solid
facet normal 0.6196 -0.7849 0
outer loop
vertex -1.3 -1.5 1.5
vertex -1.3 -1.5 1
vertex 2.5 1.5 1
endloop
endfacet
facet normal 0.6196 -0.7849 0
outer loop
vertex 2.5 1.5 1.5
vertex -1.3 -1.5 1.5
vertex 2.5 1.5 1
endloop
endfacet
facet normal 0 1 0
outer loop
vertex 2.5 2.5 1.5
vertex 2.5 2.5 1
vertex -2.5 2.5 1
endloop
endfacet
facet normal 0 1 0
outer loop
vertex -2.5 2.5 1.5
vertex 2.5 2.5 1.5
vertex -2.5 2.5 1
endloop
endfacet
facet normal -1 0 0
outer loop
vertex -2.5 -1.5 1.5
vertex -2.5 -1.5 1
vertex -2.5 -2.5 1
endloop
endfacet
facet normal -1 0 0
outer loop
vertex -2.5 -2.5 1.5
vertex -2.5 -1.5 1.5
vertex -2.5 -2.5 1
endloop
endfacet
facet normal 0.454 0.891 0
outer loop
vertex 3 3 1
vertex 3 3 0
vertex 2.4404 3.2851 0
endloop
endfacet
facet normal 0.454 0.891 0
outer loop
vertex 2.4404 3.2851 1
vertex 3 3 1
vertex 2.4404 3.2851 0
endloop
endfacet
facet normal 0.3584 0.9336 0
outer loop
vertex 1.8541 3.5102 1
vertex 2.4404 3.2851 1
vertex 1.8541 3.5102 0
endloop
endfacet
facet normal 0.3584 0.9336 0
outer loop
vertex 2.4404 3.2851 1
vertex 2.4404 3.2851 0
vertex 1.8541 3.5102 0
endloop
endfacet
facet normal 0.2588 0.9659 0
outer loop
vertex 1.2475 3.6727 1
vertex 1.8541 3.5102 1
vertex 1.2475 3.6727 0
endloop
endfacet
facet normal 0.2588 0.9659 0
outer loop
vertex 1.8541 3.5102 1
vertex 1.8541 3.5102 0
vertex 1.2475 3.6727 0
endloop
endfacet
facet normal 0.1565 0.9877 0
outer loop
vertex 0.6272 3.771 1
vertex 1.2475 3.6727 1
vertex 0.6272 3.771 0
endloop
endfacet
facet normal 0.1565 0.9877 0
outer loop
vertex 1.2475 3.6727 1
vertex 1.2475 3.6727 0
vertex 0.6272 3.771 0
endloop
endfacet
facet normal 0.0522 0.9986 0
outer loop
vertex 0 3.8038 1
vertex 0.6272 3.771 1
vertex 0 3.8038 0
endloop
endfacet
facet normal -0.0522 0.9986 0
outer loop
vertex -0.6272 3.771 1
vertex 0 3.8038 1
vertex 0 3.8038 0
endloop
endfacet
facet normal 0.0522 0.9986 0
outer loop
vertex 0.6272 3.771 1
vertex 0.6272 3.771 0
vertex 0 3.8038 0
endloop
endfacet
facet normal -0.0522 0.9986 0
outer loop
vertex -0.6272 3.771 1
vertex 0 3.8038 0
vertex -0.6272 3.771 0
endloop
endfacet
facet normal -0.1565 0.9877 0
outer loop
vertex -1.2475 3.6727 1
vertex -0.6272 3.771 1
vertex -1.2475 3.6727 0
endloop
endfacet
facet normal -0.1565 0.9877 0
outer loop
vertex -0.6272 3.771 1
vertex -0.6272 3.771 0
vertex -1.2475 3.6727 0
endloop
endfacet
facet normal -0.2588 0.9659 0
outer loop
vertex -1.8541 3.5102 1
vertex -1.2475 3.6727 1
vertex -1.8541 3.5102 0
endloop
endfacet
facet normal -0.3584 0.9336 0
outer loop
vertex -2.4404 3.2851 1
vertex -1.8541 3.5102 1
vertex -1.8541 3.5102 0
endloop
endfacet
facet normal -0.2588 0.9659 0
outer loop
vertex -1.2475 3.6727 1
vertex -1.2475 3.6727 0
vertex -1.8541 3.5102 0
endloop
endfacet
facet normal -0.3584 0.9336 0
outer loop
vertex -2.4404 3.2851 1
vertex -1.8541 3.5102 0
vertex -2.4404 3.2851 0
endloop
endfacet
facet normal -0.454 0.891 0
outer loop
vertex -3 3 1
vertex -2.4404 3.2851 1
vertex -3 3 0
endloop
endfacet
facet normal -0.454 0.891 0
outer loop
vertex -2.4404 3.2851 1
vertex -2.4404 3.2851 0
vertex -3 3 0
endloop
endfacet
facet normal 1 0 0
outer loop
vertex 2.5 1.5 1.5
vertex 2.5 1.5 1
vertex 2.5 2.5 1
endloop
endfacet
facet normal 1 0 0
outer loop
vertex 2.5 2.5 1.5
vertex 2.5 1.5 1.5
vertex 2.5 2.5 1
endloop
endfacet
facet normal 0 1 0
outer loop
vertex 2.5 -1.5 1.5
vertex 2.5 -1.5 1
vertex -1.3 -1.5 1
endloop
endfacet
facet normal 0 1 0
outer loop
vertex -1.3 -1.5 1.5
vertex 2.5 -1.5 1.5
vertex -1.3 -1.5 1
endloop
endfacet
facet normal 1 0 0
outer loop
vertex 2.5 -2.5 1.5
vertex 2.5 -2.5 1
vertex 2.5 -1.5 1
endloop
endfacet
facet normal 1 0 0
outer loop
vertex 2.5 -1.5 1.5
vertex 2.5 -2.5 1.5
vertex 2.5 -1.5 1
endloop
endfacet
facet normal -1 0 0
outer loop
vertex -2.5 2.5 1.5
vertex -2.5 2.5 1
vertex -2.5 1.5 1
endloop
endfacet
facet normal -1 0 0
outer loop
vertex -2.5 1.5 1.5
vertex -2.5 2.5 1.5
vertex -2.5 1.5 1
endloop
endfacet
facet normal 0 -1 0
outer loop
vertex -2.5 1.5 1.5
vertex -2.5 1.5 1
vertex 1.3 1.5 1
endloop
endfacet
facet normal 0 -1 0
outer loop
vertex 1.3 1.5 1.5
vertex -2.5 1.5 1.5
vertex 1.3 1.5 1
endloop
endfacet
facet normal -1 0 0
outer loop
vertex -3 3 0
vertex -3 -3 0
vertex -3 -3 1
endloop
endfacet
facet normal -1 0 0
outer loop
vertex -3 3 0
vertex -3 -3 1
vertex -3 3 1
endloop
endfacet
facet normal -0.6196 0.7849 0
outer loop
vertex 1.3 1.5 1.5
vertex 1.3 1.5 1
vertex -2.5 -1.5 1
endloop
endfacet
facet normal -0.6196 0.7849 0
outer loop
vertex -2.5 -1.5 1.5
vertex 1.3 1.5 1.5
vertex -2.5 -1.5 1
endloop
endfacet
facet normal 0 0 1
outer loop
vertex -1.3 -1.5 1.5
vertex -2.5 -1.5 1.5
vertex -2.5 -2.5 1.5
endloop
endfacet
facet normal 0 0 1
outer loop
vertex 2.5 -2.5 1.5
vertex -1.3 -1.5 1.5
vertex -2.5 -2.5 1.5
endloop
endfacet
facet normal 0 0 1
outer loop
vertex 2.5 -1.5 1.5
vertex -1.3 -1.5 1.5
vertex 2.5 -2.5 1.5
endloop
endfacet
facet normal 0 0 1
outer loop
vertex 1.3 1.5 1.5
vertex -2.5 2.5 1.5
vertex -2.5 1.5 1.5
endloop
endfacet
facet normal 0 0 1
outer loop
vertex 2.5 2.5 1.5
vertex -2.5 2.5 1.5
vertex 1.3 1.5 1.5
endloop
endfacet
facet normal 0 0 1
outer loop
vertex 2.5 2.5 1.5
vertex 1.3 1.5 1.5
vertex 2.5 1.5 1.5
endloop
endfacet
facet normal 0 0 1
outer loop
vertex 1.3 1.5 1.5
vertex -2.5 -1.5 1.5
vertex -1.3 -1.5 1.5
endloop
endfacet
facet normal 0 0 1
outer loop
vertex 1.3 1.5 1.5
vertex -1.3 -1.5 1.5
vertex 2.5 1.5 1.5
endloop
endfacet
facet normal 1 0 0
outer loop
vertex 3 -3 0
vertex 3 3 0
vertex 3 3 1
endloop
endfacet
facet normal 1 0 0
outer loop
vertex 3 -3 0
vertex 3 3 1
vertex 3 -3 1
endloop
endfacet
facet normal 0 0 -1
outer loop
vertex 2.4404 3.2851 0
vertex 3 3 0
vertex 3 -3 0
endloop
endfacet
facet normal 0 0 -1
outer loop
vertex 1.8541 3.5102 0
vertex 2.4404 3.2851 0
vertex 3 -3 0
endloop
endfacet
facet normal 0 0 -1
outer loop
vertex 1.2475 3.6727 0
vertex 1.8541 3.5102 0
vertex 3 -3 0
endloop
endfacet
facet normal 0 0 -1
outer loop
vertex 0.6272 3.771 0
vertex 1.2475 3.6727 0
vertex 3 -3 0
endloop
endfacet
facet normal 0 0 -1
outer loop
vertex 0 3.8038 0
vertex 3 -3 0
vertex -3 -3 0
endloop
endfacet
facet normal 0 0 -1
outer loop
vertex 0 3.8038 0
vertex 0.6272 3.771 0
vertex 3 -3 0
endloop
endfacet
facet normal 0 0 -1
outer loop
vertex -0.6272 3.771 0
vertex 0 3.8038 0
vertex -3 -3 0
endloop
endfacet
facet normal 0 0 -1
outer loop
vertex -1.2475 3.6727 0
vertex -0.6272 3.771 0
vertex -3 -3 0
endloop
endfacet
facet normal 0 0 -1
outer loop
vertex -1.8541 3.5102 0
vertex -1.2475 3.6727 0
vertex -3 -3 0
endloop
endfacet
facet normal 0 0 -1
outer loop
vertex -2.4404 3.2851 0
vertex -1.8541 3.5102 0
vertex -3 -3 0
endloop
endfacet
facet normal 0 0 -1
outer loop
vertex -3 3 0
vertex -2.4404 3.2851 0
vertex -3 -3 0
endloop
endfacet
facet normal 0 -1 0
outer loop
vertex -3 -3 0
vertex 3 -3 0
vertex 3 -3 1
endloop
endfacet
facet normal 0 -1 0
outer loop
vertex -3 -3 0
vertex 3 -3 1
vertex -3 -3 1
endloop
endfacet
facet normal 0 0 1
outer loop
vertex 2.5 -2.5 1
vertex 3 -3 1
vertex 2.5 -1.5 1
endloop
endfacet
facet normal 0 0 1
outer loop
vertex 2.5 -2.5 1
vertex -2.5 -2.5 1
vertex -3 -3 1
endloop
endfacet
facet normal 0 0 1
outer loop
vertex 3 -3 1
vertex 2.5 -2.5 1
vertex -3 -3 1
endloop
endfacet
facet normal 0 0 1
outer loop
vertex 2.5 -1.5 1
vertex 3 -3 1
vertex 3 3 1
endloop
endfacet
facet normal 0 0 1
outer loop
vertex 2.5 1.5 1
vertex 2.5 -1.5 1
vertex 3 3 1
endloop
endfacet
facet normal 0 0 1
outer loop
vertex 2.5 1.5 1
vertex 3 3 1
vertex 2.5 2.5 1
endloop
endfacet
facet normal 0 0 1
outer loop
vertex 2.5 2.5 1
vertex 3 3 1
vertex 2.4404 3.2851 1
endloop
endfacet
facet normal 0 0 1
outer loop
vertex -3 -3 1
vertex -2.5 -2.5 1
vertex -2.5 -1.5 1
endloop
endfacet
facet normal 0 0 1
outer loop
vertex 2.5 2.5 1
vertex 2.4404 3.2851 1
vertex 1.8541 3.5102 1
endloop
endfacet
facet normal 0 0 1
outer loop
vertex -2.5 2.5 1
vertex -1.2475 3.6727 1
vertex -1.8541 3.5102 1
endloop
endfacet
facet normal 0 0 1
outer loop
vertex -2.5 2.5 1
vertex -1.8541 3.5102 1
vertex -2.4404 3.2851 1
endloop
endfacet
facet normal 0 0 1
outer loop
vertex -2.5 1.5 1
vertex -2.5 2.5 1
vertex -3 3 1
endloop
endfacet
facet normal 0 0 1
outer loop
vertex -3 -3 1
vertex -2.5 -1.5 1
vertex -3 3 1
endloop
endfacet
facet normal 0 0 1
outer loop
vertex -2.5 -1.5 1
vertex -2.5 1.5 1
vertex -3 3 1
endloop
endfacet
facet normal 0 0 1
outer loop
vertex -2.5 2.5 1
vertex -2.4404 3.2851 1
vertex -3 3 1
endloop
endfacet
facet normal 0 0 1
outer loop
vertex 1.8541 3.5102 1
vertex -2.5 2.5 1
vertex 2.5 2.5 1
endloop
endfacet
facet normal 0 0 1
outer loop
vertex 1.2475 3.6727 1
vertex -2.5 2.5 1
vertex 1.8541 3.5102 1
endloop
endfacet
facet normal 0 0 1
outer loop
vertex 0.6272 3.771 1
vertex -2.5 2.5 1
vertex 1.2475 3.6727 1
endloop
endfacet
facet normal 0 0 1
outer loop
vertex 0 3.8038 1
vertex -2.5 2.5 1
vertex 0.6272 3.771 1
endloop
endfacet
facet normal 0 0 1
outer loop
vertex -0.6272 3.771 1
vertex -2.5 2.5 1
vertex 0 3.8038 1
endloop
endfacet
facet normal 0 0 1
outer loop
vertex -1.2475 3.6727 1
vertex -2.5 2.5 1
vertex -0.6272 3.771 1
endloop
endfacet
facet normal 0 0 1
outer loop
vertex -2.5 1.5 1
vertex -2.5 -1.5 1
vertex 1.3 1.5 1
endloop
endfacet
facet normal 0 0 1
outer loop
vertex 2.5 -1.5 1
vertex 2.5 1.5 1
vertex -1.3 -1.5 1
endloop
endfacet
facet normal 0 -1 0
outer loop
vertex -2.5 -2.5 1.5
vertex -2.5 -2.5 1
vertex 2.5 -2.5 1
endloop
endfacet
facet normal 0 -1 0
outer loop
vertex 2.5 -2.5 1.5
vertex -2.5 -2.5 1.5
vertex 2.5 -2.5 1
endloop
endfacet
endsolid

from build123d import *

# Parameters (mm, degrees)
PAD_DEPTH    = 1
PAD001_DEPTH = 0.5


with BuildPart() as part:
    # Sketch → Pad (new body)
    with BuildSketch(Plane.XY):
        with BuildLine():
            Line((3, 3), (3, -3))
            Line((3, -3), (-3, -3))
            Line((-3, -3), (-3, 3))
            ThreePointArc((3, 3), (0, 3.803848), (-3, 3))
        make_face()
    extrude(amount=PAD_DEPTH)

    # Sketch001 → Pad001 (new body)
    with BuildSketch(Plane.XY.offset(1)):
        Polygon((-2.5, 2.5), (-2.5, 1.5), (1.3, 1.5), (-2.5, -1.5), (-2.5, -2.5), (2.5, -2.5), (2.5, -1.5), (-1.3, -1.5), (2.5, 1.5), (2.5, 2.5), align=None)
    extrude(amount=PAD001_DEPTH)


solid = part.part
